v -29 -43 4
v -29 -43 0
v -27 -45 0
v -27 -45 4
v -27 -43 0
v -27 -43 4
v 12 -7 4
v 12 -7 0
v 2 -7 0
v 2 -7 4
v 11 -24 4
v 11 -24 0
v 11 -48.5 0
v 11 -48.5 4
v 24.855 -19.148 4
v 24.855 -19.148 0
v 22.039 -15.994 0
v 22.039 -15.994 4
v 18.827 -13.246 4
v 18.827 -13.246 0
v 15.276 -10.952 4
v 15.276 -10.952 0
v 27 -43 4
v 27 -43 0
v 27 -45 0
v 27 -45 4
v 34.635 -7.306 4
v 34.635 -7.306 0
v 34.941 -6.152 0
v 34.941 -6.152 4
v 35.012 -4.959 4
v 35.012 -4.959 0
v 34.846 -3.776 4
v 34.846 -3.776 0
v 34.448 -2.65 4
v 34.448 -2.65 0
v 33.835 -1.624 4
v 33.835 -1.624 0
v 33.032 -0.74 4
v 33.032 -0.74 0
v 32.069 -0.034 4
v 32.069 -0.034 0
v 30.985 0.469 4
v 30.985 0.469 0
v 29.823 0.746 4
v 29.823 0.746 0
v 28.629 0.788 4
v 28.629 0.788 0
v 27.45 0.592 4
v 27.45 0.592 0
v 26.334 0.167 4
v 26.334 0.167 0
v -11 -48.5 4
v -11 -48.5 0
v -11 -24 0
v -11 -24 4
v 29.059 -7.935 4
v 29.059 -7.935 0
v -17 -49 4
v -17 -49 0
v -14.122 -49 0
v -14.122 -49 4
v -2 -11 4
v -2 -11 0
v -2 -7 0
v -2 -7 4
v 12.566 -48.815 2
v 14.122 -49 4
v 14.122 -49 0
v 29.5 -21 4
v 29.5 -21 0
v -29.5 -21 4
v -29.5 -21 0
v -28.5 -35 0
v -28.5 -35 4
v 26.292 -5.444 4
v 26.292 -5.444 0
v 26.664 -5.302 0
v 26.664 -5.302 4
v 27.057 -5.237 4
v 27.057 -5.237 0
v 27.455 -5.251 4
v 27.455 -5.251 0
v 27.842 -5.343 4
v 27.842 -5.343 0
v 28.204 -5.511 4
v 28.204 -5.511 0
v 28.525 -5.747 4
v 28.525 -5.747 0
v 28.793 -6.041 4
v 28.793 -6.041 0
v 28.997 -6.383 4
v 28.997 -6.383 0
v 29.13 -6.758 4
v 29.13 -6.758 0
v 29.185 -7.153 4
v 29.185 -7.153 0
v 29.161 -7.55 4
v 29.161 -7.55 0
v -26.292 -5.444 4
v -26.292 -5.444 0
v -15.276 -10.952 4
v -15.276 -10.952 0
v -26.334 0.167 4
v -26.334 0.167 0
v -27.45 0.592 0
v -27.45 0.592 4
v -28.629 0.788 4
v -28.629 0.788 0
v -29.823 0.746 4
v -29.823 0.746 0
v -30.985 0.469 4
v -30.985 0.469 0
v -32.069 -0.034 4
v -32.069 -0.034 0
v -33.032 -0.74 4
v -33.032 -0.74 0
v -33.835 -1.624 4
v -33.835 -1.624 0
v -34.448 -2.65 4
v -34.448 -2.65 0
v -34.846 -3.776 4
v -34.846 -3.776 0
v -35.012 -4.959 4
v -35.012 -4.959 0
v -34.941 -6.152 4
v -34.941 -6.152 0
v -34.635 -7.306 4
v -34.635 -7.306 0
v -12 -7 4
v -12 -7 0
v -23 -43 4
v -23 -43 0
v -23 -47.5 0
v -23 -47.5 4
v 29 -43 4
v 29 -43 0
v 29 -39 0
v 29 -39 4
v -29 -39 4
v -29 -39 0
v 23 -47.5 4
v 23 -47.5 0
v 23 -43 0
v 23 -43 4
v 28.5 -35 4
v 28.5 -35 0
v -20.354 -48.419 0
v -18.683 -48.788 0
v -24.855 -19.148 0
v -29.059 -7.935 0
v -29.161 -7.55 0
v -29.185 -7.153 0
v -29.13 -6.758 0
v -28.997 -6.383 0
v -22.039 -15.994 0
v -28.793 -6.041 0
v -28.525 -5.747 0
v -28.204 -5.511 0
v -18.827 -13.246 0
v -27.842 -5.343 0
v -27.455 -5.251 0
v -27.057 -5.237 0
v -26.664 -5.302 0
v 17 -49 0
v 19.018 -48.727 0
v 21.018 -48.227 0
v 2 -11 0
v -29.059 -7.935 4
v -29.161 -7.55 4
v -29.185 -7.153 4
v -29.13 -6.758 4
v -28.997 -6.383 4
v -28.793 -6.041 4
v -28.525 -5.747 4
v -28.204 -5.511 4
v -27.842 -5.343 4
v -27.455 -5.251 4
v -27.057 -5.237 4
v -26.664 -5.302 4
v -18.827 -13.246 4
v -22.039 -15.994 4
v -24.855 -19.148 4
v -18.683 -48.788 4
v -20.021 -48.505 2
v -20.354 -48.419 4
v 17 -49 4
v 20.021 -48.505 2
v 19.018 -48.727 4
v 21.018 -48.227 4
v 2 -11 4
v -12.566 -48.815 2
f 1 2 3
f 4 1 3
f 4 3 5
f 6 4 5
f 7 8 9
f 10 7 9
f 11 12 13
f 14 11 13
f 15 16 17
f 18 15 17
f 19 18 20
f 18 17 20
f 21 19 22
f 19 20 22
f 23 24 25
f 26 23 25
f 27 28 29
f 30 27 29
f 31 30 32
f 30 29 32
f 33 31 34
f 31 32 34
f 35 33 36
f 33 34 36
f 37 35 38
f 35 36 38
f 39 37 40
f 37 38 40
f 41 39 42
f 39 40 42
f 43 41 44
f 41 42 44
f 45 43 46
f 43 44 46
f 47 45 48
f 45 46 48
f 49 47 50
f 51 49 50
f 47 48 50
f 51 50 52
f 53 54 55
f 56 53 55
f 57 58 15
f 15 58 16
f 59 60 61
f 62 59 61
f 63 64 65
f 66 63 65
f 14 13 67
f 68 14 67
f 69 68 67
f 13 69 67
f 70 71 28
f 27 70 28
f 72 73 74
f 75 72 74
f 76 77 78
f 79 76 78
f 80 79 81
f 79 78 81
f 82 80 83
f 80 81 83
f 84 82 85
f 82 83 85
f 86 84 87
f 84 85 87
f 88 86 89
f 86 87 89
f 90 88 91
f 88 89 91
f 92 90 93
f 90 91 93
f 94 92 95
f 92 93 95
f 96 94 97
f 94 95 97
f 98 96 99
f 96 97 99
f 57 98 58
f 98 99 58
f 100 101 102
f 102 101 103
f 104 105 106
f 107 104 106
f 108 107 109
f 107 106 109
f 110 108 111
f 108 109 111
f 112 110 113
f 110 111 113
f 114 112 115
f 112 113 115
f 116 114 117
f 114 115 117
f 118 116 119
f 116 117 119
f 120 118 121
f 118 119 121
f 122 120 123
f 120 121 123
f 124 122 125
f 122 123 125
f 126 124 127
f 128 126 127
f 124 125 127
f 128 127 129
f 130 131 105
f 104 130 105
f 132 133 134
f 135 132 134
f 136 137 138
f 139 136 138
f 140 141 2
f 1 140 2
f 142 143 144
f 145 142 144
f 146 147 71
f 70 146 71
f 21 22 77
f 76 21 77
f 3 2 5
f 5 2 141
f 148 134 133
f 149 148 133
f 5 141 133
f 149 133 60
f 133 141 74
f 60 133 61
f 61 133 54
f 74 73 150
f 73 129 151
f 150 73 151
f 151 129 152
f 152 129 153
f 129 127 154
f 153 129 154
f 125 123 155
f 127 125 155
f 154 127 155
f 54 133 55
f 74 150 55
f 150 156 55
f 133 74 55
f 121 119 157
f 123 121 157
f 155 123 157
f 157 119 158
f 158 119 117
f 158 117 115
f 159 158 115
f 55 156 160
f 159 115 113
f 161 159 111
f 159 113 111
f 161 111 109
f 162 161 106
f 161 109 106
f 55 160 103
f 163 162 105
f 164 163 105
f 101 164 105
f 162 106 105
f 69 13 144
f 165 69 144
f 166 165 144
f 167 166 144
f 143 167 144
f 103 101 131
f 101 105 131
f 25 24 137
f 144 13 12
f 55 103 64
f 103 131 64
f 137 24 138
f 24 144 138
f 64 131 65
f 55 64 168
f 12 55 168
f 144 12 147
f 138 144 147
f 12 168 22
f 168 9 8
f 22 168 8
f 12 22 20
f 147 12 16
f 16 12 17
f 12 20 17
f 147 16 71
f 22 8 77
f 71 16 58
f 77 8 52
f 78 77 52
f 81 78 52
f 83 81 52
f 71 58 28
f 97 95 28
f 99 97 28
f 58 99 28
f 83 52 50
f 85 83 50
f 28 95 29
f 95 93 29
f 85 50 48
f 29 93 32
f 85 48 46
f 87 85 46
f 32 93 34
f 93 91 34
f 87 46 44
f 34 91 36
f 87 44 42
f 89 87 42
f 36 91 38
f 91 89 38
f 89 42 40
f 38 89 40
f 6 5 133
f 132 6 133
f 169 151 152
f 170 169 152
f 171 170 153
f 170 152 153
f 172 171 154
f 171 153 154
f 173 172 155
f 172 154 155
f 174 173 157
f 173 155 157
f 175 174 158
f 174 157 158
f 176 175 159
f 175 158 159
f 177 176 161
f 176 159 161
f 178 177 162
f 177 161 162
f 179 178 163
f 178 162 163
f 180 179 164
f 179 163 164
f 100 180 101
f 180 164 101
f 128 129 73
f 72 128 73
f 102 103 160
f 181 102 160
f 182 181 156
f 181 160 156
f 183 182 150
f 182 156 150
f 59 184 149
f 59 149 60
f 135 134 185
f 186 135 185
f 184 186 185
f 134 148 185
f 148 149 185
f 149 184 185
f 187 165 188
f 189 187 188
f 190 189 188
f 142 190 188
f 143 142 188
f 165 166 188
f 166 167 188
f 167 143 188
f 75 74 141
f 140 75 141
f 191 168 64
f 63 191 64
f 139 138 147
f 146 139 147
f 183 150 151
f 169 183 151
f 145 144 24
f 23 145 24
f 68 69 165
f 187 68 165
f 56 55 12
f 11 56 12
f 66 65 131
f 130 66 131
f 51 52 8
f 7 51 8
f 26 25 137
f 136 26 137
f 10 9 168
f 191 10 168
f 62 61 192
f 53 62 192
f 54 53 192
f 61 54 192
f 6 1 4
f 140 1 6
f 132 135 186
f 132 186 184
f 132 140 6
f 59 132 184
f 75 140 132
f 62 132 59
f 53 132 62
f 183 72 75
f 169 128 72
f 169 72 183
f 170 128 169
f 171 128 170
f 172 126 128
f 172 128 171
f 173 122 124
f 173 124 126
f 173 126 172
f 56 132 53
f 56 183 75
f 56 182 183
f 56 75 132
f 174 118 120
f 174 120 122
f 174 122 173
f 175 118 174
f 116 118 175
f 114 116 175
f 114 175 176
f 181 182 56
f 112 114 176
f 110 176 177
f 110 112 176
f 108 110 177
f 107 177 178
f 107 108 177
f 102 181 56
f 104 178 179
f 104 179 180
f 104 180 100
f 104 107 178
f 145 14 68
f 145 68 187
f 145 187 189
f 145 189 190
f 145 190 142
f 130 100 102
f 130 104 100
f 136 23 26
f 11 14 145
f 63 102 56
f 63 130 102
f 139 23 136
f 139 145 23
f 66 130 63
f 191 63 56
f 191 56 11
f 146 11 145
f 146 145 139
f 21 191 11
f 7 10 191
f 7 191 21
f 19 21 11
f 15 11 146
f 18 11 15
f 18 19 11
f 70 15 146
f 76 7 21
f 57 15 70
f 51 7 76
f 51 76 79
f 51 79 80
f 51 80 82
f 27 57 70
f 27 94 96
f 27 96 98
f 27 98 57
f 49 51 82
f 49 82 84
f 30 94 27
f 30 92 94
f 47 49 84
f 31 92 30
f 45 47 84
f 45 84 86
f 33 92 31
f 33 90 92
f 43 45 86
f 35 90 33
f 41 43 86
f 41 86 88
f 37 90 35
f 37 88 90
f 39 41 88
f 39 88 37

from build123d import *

# Parameters (mm, degrees)
ESTRUSIONE_ESTRUSIONE1_DEPTH = 4


with BuildPart() as part:
    # Schizzo1 → Estrusione-Estrusione1 (new body)
    with BuildSketch(Plane.XY):
        with BuildLine():
            Line((2, -11), (-2, -11))
            Line((-2, -11), (-2, -7))
            Line((-2, -7), (-12, -7))
            Line((-12, -7), (-26.333851616, 0.166925808))
            ThreePointArc((-26.333851616, 0.166925808), (-33.031566385, -0.74045287), (-34.635108255, -7.306377987))
            Line((-34.635108255, -7.306377987), (-29.5, -21))
            Line((-29.5, -21), (-28.5, -35))
            Line((-28.5, -35), (-29, -39))
            Line((-29, -39), (-29, -43))
            Line((-29, -43), (-27, -45))
            Line((-27, -45), (-27, -43))
            Line((-27, -43), (-23, -43))
            Line((-23, -43), (-23, -47.5))
            add(Edge.make_bspline(
                [(-23, -47.5), (-20.041371852, -48.760160273), (-17, -49)],
                knots=[0, 0, 0, 0.506712619, 0.506712619, 0.506712619], degree=2))
            Line((-17, -49), (-14.122054723, -49))
            add(Edge.make_bspline(
                [(-14.122054723, -49), (-12.571510592, -48.87926972), (-11, -48.5)],
                knots=[0.744931513, 0.744931513, 0.744931513, 1, 1, 1], degree=2))
            Line((-11, -48.5), (-11, -24))
            Line((-11, -24), (11, -24))
            Line((11, -24), (11, -48.5))
            add(Edge.make_bspline(
                [(11, -48.5), (12.571510592, -48.87926972), (14.122054723, -49)],
                knots=[0, 0, 0, 0.255068487, 0.255068487, 0.255068487], degree=2))
            Line((14.122054723, -49), (17, -49))
            add(Edge.make_bspline(
                [(17, -49), (20.041371852, -48.760160273), (23, -47.5)],
                knots=[0.493287381, 0.493287381, 0.493287381, 1, 1, 1], degree=2))
            Line((23, -47.5), (23, -43))
            Line((23, -43), (27, -43))
            Line((27, -43), (27, -45))
            Line((27, -45), (29, -43))
            Line((29, -43), (29, -39))
            Line((29, -39), (28.5, -35))
            Line((28.5, -35), (29.5, -21))
            Line((29.5, -21), (34.635108255, -7.306377987))
            ThreePointArc((34.635108255, -7.306377987), (33.031566385, -0.74045287), (26.333851616, 0.166925808))
            Line((26.333851616, 0.166925808), (12, -7))
            Line((12, -7), (2, -7))
            Line((2, -7), (2, -11))
        make_face()
        with BuildLine():
            ThreePointArc((24.854524092, -19.147929512), (20.47953862, -14.565955254), (15.276187318, -10.952076285))
            Line((15.276187318, -10.952076285), (26.292228197, -5.444055845))
            ThreePointArc((26.292228197, -5.444055845), (28.524799786, -5.746515405), (29.059313743, -7.935157111))
            Line((29.059313743, -7.935157111), (24.854524092, -19.147929512))
        make_face(mode=Mode.SUBTRACT)
        with BuildLine():
            ThreePointArc((-29.059313743, -7.935157111), (-28.524799786, -5.746515405), (-26.292228197, -5.444055845))
            Line((-26.292228197, -5.444055845), (-15.276187318, -10.952076285))
            ThreePointArc((-15.276187318, -10.952076285), (-20.47953862, -14.565955254), (-24.854524092, -19.147929512))
            Line((-24.854524092, -19.147929512), (-29.059313743, -7.935157111))
        make_face(mode=Mode.SUBTRACT)
    extrude(amount=ESTRUSIONE_ESTRUSIONE1_DEPTH)


solid = part.part
